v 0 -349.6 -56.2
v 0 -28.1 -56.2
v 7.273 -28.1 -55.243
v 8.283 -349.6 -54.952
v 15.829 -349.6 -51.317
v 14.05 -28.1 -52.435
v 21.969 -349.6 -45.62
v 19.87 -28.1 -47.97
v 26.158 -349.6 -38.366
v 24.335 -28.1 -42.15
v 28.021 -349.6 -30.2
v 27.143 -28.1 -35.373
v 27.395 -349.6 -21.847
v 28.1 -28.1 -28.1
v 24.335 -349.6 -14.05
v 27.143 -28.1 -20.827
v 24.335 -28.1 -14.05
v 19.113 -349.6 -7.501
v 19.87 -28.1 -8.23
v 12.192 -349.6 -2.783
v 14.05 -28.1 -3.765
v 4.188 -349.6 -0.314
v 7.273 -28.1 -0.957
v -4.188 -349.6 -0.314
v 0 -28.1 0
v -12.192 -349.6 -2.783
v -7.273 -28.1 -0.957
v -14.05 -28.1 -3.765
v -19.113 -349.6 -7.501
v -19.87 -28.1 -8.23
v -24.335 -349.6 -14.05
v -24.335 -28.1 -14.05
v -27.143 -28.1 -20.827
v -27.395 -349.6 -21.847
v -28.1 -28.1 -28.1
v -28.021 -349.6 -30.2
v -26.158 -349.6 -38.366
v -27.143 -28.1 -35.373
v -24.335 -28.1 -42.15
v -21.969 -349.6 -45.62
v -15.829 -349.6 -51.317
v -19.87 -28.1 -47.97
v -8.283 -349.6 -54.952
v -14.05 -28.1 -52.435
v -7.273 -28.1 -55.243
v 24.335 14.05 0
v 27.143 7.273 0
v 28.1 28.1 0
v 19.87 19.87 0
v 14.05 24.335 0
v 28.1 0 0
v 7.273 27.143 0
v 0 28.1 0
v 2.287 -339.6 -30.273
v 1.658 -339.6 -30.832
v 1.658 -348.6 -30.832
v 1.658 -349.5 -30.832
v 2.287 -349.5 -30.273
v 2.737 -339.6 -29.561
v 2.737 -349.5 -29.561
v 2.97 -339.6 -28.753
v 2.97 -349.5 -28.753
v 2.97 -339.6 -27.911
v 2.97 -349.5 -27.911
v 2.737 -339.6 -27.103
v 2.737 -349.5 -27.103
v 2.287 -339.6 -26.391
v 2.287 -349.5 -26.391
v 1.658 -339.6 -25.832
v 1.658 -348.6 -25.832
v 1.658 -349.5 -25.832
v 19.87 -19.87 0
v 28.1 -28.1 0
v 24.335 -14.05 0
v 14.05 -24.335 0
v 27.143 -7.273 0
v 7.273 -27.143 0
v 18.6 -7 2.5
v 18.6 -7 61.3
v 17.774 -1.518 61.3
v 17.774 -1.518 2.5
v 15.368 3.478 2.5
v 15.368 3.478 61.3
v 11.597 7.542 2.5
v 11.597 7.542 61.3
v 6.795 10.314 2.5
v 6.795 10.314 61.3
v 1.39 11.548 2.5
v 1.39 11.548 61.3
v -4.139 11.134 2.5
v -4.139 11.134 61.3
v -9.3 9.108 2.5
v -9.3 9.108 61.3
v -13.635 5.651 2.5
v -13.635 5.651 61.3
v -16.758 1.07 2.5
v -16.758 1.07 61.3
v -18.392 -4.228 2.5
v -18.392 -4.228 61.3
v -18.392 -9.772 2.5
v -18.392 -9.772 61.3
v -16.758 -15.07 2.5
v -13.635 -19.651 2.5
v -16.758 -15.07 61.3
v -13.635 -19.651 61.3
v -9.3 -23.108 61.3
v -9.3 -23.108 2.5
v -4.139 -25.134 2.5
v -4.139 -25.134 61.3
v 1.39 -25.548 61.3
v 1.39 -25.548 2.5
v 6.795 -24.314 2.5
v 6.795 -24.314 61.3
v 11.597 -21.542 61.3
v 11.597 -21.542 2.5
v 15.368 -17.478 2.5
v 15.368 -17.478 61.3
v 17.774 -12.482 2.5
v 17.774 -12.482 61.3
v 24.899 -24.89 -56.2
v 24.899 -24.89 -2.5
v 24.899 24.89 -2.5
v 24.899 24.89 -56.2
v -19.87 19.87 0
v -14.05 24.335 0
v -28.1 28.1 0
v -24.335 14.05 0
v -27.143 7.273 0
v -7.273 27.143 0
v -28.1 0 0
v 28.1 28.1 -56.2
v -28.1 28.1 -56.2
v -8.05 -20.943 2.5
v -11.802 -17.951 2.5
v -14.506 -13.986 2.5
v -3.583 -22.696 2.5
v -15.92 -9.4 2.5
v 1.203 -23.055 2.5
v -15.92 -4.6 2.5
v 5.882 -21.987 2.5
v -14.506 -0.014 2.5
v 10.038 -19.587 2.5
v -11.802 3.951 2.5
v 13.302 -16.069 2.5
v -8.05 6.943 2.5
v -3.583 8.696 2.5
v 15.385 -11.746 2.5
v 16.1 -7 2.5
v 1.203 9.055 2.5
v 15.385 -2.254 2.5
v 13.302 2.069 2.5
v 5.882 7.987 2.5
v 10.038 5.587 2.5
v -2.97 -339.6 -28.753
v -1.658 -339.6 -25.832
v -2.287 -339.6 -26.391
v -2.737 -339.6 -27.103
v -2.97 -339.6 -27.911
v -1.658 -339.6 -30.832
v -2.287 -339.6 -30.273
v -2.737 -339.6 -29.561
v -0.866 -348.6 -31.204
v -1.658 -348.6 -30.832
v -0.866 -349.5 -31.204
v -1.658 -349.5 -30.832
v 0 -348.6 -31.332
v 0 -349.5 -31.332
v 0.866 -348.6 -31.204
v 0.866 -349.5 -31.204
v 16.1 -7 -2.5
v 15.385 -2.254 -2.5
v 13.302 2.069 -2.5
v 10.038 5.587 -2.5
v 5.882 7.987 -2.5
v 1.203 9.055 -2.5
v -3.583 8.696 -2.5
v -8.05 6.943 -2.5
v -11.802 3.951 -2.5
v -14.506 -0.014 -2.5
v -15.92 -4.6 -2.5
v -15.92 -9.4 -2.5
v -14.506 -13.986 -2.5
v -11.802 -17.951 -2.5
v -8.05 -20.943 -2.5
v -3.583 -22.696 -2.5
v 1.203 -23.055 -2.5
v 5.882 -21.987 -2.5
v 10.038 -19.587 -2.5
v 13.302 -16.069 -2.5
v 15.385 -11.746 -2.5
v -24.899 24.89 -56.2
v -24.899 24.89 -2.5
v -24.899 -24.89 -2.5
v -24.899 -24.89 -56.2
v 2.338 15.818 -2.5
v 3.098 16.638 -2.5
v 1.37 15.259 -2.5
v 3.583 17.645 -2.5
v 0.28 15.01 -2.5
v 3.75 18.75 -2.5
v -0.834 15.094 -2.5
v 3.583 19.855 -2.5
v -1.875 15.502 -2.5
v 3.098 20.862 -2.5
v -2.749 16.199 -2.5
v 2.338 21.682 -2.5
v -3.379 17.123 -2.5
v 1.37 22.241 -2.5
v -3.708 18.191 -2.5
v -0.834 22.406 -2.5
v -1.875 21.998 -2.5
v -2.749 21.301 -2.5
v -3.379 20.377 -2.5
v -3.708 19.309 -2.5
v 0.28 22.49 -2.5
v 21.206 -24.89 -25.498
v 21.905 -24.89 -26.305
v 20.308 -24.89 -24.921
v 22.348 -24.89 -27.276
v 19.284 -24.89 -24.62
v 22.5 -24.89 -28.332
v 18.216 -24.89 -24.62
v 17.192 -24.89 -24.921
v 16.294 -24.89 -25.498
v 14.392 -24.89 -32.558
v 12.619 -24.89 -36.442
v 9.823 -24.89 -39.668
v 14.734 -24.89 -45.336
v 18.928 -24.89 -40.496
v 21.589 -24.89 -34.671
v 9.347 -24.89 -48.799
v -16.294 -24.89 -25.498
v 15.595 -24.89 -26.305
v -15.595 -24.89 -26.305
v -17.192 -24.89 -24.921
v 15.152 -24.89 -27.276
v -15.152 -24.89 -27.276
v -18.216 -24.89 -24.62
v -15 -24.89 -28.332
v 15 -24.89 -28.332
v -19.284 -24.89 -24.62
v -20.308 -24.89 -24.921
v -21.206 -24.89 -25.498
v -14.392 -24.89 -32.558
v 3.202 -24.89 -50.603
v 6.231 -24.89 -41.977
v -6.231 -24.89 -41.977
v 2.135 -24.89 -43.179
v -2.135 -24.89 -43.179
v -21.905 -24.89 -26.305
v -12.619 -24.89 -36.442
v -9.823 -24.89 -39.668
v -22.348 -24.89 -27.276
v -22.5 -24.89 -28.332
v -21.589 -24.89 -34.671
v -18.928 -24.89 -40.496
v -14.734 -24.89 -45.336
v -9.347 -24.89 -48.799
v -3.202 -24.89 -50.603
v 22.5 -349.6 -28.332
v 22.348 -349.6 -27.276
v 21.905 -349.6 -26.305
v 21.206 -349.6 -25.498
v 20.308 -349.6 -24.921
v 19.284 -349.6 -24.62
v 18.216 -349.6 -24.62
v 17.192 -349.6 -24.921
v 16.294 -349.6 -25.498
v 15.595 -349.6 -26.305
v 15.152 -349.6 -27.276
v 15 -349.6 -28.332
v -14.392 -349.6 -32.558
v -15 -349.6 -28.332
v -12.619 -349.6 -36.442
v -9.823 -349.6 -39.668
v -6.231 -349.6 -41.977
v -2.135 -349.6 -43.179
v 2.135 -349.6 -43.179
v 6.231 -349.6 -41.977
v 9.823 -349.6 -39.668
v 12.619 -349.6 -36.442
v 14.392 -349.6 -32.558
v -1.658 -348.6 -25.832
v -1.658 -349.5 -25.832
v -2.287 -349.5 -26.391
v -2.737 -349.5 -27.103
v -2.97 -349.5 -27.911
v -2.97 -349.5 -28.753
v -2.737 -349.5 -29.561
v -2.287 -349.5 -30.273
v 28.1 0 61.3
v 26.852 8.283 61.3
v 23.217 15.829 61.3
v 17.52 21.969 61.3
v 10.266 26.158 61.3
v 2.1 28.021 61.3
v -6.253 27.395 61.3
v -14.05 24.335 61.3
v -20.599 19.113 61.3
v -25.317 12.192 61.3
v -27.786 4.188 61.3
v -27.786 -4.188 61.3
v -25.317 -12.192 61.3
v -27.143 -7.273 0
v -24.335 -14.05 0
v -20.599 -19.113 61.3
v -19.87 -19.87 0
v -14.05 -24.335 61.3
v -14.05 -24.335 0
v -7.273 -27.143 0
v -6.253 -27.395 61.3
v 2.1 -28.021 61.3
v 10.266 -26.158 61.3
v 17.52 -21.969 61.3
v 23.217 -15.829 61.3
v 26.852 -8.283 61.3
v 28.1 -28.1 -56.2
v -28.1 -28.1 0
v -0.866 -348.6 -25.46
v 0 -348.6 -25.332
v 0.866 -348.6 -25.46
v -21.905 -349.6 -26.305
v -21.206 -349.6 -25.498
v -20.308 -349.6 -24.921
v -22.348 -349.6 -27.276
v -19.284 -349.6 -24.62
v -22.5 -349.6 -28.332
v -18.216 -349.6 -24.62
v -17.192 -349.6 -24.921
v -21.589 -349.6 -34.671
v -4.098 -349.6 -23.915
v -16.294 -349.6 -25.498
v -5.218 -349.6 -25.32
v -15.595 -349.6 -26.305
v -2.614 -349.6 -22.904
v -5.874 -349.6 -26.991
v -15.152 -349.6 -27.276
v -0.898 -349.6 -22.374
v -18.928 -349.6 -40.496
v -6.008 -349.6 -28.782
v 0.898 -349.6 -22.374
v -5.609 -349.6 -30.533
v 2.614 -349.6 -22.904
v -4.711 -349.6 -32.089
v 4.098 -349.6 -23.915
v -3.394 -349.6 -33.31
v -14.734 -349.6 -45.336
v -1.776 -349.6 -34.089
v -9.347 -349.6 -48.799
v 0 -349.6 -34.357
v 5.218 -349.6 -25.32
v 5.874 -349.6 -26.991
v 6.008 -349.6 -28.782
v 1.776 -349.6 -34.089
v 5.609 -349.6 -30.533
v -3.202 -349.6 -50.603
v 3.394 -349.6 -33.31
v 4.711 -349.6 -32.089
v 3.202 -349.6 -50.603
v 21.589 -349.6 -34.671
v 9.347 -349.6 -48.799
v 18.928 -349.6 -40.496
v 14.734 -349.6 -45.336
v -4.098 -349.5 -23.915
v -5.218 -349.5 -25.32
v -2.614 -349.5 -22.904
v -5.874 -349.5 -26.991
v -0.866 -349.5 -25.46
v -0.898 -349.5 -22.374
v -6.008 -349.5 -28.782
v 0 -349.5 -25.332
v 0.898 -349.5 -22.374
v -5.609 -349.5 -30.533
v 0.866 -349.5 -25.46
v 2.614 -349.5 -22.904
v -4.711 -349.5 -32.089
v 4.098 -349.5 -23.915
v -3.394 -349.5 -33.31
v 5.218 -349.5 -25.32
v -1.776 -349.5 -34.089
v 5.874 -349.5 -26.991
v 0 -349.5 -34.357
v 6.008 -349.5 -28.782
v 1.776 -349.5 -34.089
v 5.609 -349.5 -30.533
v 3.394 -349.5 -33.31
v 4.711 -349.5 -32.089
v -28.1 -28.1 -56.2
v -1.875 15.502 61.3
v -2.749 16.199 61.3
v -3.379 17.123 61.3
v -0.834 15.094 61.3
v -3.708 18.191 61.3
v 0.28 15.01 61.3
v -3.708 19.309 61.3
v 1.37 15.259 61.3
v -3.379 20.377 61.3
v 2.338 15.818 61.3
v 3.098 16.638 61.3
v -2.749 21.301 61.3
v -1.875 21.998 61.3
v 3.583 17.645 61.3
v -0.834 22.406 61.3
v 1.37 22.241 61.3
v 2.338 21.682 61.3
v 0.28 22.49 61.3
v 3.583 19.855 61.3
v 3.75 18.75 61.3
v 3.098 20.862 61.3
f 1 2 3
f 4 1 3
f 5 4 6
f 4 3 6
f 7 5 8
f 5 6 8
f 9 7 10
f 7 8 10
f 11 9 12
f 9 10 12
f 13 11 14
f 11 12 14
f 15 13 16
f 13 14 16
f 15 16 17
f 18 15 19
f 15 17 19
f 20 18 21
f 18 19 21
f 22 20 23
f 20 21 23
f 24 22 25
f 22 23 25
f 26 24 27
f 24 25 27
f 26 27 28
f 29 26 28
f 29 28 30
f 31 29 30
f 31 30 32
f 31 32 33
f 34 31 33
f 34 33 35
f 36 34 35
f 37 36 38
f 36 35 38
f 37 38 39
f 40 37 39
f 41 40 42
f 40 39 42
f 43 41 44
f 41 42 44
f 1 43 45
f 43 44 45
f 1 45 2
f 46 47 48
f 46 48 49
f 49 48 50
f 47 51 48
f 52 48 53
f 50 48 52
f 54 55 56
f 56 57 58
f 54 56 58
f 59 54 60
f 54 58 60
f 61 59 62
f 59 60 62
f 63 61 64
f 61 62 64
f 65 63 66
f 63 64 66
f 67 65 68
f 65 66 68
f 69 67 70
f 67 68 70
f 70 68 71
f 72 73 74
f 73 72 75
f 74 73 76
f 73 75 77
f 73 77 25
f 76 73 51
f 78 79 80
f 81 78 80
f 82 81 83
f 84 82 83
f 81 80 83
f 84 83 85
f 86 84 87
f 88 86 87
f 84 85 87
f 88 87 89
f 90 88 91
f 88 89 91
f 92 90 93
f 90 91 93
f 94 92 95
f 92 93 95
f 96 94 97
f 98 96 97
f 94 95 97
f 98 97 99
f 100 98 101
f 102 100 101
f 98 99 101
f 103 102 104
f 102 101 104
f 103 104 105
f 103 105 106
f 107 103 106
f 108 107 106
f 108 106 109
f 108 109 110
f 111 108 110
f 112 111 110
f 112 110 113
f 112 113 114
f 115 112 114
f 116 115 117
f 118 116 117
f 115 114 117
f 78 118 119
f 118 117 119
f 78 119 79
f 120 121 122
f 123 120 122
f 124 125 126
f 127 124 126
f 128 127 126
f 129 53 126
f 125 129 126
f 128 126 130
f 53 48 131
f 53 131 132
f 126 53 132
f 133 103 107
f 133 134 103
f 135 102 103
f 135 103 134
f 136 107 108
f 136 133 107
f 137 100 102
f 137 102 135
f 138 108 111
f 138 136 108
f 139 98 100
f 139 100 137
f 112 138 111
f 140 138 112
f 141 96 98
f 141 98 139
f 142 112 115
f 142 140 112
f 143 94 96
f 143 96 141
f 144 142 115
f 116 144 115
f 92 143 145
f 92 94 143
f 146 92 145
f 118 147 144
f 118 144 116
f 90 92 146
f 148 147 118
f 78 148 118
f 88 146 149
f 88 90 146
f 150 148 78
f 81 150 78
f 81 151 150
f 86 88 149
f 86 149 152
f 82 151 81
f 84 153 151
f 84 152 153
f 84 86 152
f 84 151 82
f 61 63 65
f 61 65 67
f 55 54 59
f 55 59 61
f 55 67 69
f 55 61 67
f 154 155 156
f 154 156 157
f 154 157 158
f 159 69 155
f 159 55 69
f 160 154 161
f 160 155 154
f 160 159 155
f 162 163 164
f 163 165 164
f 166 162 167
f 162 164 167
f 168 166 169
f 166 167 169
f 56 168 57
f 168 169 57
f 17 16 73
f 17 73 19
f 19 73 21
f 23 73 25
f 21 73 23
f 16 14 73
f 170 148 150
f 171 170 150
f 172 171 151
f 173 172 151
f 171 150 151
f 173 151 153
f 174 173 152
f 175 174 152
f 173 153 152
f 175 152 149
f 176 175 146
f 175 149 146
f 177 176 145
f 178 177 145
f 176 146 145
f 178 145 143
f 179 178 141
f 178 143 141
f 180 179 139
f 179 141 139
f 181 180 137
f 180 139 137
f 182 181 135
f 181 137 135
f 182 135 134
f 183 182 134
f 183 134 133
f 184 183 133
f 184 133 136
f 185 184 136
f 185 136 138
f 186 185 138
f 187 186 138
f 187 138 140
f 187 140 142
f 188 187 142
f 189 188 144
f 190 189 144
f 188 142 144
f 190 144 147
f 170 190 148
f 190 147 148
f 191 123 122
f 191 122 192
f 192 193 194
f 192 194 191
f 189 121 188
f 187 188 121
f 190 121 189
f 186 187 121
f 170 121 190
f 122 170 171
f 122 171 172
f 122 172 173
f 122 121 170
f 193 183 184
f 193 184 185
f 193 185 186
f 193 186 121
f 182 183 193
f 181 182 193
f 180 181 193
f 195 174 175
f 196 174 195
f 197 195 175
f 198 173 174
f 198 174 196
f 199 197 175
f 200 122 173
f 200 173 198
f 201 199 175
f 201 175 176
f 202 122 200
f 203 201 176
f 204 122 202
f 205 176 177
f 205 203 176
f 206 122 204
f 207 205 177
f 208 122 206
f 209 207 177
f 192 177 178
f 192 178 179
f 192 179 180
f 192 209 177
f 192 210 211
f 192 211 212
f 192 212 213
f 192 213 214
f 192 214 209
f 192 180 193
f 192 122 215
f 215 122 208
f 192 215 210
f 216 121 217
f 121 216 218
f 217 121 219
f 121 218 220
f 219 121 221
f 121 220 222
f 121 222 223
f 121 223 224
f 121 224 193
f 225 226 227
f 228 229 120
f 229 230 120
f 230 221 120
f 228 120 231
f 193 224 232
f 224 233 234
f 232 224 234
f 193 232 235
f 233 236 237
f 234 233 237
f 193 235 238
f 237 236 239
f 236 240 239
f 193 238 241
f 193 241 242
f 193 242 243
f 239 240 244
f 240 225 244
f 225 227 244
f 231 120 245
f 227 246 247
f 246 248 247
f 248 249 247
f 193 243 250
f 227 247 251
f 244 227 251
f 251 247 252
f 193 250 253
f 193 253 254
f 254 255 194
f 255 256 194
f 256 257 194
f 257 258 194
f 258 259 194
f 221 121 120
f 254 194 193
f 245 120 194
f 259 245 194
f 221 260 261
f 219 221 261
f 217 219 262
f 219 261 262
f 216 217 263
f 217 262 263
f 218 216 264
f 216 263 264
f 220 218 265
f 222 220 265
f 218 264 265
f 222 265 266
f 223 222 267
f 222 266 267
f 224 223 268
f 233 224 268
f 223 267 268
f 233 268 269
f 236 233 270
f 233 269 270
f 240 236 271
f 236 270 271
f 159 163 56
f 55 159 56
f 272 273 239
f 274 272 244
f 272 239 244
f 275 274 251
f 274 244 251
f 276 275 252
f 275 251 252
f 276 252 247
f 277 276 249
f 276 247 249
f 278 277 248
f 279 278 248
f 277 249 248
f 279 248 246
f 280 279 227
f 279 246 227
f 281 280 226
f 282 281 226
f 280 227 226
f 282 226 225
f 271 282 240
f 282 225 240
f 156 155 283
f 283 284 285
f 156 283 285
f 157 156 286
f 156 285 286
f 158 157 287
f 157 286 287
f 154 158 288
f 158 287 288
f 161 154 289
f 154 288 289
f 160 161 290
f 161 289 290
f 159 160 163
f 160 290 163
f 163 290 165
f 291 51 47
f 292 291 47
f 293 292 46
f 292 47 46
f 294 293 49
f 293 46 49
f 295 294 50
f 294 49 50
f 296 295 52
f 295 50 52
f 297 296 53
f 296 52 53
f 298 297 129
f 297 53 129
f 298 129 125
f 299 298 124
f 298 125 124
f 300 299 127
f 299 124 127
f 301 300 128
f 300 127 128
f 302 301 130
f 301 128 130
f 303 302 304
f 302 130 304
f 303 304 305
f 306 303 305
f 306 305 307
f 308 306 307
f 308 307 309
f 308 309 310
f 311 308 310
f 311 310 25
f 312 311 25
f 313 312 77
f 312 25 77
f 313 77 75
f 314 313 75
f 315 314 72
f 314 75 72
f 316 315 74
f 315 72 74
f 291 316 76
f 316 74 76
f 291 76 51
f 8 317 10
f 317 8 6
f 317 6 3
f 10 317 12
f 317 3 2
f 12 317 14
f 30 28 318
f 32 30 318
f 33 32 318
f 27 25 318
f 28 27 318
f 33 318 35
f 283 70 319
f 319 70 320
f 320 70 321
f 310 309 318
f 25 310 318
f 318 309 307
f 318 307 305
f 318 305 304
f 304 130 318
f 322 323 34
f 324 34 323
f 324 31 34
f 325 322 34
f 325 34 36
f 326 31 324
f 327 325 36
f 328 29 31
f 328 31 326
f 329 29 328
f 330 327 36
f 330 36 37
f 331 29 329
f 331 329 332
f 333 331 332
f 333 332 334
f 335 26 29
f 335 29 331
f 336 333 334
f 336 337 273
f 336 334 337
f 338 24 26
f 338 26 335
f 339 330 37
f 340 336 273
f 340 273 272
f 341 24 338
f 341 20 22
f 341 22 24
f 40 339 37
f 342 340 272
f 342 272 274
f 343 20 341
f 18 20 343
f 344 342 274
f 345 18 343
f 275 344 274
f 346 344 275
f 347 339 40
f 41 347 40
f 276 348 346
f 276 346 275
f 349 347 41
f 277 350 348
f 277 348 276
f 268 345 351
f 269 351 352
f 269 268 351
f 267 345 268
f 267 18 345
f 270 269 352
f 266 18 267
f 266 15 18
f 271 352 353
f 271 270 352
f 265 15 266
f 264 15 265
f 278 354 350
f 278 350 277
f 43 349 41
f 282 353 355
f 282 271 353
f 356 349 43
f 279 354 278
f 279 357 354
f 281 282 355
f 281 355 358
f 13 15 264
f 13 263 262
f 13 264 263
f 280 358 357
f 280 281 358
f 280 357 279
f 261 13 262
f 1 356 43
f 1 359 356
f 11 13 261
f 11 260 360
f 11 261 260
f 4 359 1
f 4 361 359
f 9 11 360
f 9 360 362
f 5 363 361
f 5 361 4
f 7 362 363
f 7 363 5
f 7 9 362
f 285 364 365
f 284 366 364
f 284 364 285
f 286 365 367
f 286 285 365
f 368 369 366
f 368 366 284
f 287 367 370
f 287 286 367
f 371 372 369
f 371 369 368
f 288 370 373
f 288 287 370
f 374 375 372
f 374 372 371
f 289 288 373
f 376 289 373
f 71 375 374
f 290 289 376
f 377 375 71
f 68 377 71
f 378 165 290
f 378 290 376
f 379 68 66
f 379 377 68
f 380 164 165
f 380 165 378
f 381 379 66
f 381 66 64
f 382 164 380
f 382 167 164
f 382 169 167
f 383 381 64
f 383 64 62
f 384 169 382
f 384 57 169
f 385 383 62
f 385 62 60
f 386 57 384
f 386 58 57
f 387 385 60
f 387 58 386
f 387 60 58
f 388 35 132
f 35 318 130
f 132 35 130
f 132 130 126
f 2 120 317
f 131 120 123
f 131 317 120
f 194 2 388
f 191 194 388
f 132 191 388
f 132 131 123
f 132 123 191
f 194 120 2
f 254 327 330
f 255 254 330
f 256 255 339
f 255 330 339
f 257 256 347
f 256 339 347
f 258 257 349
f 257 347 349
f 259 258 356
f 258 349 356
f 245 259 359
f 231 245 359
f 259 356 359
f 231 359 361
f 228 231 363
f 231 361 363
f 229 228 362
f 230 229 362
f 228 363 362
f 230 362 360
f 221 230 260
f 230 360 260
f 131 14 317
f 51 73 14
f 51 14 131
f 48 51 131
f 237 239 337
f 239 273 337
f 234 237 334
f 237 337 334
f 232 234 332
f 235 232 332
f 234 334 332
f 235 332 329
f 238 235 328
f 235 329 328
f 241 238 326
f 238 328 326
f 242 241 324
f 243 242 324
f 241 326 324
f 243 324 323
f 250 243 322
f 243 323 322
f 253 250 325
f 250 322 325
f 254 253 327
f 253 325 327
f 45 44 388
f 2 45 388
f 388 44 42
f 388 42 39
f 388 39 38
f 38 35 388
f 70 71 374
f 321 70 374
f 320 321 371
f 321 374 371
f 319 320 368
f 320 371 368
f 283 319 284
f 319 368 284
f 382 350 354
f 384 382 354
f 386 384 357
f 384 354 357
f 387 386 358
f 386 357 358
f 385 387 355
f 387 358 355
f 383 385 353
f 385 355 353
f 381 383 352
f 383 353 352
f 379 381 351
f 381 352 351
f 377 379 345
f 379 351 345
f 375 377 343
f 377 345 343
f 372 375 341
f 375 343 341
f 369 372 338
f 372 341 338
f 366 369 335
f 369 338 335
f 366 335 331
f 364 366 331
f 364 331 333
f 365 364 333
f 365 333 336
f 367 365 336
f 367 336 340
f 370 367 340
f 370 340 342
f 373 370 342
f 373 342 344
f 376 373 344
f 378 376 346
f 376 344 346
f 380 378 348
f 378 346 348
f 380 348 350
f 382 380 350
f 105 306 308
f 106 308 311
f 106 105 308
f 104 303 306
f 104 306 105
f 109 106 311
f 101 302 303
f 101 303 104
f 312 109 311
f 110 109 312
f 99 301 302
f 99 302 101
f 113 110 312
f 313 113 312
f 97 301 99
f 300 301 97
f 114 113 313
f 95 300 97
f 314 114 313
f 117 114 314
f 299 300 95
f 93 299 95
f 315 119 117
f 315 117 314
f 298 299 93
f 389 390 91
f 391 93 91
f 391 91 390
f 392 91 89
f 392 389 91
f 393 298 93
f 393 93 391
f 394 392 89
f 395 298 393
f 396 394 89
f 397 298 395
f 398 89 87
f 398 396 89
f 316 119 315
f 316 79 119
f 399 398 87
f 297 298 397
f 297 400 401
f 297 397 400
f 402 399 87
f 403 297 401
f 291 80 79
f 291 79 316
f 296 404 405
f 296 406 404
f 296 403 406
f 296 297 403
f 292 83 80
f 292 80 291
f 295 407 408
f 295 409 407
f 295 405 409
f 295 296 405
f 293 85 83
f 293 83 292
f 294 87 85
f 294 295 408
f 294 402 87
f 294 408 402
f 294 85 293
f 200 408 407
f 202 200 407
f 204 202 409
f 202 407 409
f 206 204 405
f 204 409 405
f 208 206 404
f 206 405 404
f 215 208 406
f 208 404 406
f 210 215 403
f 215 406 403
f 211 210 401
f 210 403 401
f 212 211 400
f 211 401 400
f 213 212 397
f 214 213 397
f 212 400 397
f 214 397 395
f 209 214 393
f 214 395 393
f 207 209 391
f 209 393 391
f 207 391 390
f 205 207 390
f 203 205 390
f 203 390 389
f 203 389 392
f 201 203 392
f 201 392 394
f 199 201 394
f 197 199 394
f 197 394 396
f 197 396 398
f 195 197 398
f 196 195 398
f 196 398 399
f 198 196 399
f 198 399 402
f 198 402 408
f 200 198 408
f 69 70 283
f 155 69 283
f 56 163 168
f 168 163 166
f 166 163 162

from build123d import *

# Parameters (mm, degrees)
SKETCH1_R           = 28.1
BOSS_EXTRUDE2_DEPTH = 61.3
SKETCH3_R           = 18.6
CUT_EXTRUDE2_DEPTH  = 58.8
SKETCH4_W           = 56.2
SKETCH4_H           = 56.2
BOSS_EXTRUDE3_DEPTH = 56.2
SKETCH5_R           = 16.1
CUT_EXTRUDE4_DEPTH  = 5
SKETCH6_W           = 49.797391422
SKETCH6_H           = 49.779255452
CUT_EXTRUDE5_DEPTH  = 53.7
SKETCH7_R           = 28.1
BOSS_EXTRUDE4_DEPTH = 321.5
CUT_EXTRUDE6_DEPTH  = 10
SKETCH9_R           = 3
CUT_EXTRUDE7_DEPTH  = 1
SKETCH10_R          = 6.025
CUT_EXTRUDE8_DEPTH  = 0.1
SKETCH18_R          = 3.75
CUT_EXTRUDE9_DEPTH  = 100
SKETCH19_R          = 3.75
CUT_EXTRUDE11_DEPTH = 325


with BuildPart() as part:
    # Sketch1 → Boss-Extrude2 (new body)
    with BuildSketch(Plane.XY):
        Circle(SKETCH1_R)
    extrude(amount=BOSS_EXTRUDE2_DEPTH)

    # Sketch3 → Cut-Extrude2 (cut)
    with BuildSketch(Plane.XY.offset(61.3)):
        with Locations((0, -7)):
            Circle(SKETCH3_R)
    extrude(amount=-CUT_EXTRUDE2_DEPTH, mode=Mode.SUBTRACT)

    # Sketch4 → Boss-Extrude3 (add)
    with BuildSketch(Plane(origin=(0, 0, 0), x_dir=(-1, 0, 0), z_dir=(0, 0, -1))):
        Rectangle(SKETCH4_W, SKETCH4_H)
    extrude(amount=BOSS_EXTRUDE3_DEPTH)

    # Sketch5 → Cut-Extrude4 (cut)
    with BuildSketch(Plane.XY.offset(2.5)):
        with Locations((0, -7)):
            Circle(SKETCH5_R)
    extrude(amount=-CUT_EXTRUDE4_DEPTH, mode=Mode.SUBTRACT)

    # Sketch6 → Cut-Extrude5 (cut)
    with BuildSketch(Plane(origin=(0, 0, -56.2), x_dir=(-1, 0, 0), z_dir=(0, 0, -1))):
        Rectangle(SKETCH6_W, SKETCH6_H)
    extrude(amount=-CUT_EXTRUDE5_DEPTH, mode=Mode.SUBTRACT)

    # Sketch7 → Boss-Extrude4 (add)
    with BuildSketch(Plane(origin=(0, -28.1, 0), x_dir=(-1, 0, 0), z_dir=(0, -1, 0))):
        with Locations(Location((0, 28.1, 0), (0, 0, 90))):
            Circle(SKETCH7_R)
    extrude(amount=BOSS_EXTRUDE4_DEPTH)

    # Sketch8 → Cut-Extrude6 (cut)
    with BuildSketch(Plane(origin=(0, -349.6, 0), x_dir=(-1, 0, 0), z_dir=(0, -1, 0))):
        with BuildLine():
            Line((-1.658312395, 25.832078896), (1.658312395, 25.832078896))
            ThreePointArc((1.658312395, 25.832078896), (3, 28.332078896), (1.658312395, 30.832078896))
            Line((1.658312395, 30.832078896), (-1.658312395, 30.832078896))
            ThreePointArc((-1.658312395, 30.832078896), (-3, 28.332078896), (-1.658312395, 25.832078896))
        make_face()
    extrude(amount=-CUT_EXTRUDE6_DEPTH, mode=Mode.SUBTRACT)

    # Sketch9 → Cut-Extrude7 (cut)
    with BuildSketch(Plane(origin=(0, -349.6, 0), x_dir=(-1, 0, 0), z_dir=(0, -1, 0))):
        with Locations(Location((0, 28.332078896, 0), (0, 0, 90))):
            Circle(SKETCH9_R)
    extrude(amount=-CUT_EXTRUDE7_DEPTH, mode=Mode.SUBTRACT)

    # Sketch10 → Cut-Extrude8 (cut)
    with BuildSketch(Plane(origin=(0, -349.6, 0), x_dir=(-1, 0, 0), z_dir=(0, -1, 0))):
        with Locations(Location((0, 28.332078896, 0), (0, 0, 90))):
            Circle(SKETCH10_R)
    extrude(amount=-CUT_EXTRUDE8_DEPTH, mode=Mode.SUBTRACT)

    # Cut-Sweep4: sweep along a path in Sketch15
    with BuildLine(Plane(origin=(0, -349.6, 0), x_dir=(-1, 0, 0), z_dir=(0, -1, 0))) as cut_sweep4_path:
        ThreePointArc((15, 28.332078896), (0, 43.332078896), (-15, 28.332078896))
    # 3DSketch2 → Cut-Sweep4 (sweep, cut)
    with BuildSketch(Plane(origin=(-15, -349.6, -28.332078896), x_dir=(-0.022748965612757834, 0.999741208795331, 0), z_dir=(0, 0, 1))):
        Polygon((0, 0), (0.170617242, 7.498059066), (329.685319661, 0), (329.514702419, -7.498059066), align=None)
    sweep(path=cut_sweep4_path.line, mode=Mode.SUBTRACT)

    # Sketch18 → Cut-Extrude9 (cut)
    with BuildSketch(Plane.XY.offset(61.3)):
        with Locations((0, 18.75)):
            Circle(SKETCH18_R)
    extrude(amount=-CUT_EXTRUDE9_DEPTH, mode=Mode.SUBTRACT)

    # Sketch19 → Cut-Extrude11 (cut)
    with BuildSketch(Plane(origin=(0, -349.6, 0), x_dir=(-1, 0, 0), z_dir=(0, -1, 0))):
        with Locations((-18.75, 28.332078896)):
            Circle(SKETCH19_R)
        with Locations((18.75, 28.332078896)):
            Circle(SKETCH19_R)
    extrude(amount=-CUT_EXTRUDE11_DEPTH, mode=Mode.SUBTRACT)


solid = part.part
